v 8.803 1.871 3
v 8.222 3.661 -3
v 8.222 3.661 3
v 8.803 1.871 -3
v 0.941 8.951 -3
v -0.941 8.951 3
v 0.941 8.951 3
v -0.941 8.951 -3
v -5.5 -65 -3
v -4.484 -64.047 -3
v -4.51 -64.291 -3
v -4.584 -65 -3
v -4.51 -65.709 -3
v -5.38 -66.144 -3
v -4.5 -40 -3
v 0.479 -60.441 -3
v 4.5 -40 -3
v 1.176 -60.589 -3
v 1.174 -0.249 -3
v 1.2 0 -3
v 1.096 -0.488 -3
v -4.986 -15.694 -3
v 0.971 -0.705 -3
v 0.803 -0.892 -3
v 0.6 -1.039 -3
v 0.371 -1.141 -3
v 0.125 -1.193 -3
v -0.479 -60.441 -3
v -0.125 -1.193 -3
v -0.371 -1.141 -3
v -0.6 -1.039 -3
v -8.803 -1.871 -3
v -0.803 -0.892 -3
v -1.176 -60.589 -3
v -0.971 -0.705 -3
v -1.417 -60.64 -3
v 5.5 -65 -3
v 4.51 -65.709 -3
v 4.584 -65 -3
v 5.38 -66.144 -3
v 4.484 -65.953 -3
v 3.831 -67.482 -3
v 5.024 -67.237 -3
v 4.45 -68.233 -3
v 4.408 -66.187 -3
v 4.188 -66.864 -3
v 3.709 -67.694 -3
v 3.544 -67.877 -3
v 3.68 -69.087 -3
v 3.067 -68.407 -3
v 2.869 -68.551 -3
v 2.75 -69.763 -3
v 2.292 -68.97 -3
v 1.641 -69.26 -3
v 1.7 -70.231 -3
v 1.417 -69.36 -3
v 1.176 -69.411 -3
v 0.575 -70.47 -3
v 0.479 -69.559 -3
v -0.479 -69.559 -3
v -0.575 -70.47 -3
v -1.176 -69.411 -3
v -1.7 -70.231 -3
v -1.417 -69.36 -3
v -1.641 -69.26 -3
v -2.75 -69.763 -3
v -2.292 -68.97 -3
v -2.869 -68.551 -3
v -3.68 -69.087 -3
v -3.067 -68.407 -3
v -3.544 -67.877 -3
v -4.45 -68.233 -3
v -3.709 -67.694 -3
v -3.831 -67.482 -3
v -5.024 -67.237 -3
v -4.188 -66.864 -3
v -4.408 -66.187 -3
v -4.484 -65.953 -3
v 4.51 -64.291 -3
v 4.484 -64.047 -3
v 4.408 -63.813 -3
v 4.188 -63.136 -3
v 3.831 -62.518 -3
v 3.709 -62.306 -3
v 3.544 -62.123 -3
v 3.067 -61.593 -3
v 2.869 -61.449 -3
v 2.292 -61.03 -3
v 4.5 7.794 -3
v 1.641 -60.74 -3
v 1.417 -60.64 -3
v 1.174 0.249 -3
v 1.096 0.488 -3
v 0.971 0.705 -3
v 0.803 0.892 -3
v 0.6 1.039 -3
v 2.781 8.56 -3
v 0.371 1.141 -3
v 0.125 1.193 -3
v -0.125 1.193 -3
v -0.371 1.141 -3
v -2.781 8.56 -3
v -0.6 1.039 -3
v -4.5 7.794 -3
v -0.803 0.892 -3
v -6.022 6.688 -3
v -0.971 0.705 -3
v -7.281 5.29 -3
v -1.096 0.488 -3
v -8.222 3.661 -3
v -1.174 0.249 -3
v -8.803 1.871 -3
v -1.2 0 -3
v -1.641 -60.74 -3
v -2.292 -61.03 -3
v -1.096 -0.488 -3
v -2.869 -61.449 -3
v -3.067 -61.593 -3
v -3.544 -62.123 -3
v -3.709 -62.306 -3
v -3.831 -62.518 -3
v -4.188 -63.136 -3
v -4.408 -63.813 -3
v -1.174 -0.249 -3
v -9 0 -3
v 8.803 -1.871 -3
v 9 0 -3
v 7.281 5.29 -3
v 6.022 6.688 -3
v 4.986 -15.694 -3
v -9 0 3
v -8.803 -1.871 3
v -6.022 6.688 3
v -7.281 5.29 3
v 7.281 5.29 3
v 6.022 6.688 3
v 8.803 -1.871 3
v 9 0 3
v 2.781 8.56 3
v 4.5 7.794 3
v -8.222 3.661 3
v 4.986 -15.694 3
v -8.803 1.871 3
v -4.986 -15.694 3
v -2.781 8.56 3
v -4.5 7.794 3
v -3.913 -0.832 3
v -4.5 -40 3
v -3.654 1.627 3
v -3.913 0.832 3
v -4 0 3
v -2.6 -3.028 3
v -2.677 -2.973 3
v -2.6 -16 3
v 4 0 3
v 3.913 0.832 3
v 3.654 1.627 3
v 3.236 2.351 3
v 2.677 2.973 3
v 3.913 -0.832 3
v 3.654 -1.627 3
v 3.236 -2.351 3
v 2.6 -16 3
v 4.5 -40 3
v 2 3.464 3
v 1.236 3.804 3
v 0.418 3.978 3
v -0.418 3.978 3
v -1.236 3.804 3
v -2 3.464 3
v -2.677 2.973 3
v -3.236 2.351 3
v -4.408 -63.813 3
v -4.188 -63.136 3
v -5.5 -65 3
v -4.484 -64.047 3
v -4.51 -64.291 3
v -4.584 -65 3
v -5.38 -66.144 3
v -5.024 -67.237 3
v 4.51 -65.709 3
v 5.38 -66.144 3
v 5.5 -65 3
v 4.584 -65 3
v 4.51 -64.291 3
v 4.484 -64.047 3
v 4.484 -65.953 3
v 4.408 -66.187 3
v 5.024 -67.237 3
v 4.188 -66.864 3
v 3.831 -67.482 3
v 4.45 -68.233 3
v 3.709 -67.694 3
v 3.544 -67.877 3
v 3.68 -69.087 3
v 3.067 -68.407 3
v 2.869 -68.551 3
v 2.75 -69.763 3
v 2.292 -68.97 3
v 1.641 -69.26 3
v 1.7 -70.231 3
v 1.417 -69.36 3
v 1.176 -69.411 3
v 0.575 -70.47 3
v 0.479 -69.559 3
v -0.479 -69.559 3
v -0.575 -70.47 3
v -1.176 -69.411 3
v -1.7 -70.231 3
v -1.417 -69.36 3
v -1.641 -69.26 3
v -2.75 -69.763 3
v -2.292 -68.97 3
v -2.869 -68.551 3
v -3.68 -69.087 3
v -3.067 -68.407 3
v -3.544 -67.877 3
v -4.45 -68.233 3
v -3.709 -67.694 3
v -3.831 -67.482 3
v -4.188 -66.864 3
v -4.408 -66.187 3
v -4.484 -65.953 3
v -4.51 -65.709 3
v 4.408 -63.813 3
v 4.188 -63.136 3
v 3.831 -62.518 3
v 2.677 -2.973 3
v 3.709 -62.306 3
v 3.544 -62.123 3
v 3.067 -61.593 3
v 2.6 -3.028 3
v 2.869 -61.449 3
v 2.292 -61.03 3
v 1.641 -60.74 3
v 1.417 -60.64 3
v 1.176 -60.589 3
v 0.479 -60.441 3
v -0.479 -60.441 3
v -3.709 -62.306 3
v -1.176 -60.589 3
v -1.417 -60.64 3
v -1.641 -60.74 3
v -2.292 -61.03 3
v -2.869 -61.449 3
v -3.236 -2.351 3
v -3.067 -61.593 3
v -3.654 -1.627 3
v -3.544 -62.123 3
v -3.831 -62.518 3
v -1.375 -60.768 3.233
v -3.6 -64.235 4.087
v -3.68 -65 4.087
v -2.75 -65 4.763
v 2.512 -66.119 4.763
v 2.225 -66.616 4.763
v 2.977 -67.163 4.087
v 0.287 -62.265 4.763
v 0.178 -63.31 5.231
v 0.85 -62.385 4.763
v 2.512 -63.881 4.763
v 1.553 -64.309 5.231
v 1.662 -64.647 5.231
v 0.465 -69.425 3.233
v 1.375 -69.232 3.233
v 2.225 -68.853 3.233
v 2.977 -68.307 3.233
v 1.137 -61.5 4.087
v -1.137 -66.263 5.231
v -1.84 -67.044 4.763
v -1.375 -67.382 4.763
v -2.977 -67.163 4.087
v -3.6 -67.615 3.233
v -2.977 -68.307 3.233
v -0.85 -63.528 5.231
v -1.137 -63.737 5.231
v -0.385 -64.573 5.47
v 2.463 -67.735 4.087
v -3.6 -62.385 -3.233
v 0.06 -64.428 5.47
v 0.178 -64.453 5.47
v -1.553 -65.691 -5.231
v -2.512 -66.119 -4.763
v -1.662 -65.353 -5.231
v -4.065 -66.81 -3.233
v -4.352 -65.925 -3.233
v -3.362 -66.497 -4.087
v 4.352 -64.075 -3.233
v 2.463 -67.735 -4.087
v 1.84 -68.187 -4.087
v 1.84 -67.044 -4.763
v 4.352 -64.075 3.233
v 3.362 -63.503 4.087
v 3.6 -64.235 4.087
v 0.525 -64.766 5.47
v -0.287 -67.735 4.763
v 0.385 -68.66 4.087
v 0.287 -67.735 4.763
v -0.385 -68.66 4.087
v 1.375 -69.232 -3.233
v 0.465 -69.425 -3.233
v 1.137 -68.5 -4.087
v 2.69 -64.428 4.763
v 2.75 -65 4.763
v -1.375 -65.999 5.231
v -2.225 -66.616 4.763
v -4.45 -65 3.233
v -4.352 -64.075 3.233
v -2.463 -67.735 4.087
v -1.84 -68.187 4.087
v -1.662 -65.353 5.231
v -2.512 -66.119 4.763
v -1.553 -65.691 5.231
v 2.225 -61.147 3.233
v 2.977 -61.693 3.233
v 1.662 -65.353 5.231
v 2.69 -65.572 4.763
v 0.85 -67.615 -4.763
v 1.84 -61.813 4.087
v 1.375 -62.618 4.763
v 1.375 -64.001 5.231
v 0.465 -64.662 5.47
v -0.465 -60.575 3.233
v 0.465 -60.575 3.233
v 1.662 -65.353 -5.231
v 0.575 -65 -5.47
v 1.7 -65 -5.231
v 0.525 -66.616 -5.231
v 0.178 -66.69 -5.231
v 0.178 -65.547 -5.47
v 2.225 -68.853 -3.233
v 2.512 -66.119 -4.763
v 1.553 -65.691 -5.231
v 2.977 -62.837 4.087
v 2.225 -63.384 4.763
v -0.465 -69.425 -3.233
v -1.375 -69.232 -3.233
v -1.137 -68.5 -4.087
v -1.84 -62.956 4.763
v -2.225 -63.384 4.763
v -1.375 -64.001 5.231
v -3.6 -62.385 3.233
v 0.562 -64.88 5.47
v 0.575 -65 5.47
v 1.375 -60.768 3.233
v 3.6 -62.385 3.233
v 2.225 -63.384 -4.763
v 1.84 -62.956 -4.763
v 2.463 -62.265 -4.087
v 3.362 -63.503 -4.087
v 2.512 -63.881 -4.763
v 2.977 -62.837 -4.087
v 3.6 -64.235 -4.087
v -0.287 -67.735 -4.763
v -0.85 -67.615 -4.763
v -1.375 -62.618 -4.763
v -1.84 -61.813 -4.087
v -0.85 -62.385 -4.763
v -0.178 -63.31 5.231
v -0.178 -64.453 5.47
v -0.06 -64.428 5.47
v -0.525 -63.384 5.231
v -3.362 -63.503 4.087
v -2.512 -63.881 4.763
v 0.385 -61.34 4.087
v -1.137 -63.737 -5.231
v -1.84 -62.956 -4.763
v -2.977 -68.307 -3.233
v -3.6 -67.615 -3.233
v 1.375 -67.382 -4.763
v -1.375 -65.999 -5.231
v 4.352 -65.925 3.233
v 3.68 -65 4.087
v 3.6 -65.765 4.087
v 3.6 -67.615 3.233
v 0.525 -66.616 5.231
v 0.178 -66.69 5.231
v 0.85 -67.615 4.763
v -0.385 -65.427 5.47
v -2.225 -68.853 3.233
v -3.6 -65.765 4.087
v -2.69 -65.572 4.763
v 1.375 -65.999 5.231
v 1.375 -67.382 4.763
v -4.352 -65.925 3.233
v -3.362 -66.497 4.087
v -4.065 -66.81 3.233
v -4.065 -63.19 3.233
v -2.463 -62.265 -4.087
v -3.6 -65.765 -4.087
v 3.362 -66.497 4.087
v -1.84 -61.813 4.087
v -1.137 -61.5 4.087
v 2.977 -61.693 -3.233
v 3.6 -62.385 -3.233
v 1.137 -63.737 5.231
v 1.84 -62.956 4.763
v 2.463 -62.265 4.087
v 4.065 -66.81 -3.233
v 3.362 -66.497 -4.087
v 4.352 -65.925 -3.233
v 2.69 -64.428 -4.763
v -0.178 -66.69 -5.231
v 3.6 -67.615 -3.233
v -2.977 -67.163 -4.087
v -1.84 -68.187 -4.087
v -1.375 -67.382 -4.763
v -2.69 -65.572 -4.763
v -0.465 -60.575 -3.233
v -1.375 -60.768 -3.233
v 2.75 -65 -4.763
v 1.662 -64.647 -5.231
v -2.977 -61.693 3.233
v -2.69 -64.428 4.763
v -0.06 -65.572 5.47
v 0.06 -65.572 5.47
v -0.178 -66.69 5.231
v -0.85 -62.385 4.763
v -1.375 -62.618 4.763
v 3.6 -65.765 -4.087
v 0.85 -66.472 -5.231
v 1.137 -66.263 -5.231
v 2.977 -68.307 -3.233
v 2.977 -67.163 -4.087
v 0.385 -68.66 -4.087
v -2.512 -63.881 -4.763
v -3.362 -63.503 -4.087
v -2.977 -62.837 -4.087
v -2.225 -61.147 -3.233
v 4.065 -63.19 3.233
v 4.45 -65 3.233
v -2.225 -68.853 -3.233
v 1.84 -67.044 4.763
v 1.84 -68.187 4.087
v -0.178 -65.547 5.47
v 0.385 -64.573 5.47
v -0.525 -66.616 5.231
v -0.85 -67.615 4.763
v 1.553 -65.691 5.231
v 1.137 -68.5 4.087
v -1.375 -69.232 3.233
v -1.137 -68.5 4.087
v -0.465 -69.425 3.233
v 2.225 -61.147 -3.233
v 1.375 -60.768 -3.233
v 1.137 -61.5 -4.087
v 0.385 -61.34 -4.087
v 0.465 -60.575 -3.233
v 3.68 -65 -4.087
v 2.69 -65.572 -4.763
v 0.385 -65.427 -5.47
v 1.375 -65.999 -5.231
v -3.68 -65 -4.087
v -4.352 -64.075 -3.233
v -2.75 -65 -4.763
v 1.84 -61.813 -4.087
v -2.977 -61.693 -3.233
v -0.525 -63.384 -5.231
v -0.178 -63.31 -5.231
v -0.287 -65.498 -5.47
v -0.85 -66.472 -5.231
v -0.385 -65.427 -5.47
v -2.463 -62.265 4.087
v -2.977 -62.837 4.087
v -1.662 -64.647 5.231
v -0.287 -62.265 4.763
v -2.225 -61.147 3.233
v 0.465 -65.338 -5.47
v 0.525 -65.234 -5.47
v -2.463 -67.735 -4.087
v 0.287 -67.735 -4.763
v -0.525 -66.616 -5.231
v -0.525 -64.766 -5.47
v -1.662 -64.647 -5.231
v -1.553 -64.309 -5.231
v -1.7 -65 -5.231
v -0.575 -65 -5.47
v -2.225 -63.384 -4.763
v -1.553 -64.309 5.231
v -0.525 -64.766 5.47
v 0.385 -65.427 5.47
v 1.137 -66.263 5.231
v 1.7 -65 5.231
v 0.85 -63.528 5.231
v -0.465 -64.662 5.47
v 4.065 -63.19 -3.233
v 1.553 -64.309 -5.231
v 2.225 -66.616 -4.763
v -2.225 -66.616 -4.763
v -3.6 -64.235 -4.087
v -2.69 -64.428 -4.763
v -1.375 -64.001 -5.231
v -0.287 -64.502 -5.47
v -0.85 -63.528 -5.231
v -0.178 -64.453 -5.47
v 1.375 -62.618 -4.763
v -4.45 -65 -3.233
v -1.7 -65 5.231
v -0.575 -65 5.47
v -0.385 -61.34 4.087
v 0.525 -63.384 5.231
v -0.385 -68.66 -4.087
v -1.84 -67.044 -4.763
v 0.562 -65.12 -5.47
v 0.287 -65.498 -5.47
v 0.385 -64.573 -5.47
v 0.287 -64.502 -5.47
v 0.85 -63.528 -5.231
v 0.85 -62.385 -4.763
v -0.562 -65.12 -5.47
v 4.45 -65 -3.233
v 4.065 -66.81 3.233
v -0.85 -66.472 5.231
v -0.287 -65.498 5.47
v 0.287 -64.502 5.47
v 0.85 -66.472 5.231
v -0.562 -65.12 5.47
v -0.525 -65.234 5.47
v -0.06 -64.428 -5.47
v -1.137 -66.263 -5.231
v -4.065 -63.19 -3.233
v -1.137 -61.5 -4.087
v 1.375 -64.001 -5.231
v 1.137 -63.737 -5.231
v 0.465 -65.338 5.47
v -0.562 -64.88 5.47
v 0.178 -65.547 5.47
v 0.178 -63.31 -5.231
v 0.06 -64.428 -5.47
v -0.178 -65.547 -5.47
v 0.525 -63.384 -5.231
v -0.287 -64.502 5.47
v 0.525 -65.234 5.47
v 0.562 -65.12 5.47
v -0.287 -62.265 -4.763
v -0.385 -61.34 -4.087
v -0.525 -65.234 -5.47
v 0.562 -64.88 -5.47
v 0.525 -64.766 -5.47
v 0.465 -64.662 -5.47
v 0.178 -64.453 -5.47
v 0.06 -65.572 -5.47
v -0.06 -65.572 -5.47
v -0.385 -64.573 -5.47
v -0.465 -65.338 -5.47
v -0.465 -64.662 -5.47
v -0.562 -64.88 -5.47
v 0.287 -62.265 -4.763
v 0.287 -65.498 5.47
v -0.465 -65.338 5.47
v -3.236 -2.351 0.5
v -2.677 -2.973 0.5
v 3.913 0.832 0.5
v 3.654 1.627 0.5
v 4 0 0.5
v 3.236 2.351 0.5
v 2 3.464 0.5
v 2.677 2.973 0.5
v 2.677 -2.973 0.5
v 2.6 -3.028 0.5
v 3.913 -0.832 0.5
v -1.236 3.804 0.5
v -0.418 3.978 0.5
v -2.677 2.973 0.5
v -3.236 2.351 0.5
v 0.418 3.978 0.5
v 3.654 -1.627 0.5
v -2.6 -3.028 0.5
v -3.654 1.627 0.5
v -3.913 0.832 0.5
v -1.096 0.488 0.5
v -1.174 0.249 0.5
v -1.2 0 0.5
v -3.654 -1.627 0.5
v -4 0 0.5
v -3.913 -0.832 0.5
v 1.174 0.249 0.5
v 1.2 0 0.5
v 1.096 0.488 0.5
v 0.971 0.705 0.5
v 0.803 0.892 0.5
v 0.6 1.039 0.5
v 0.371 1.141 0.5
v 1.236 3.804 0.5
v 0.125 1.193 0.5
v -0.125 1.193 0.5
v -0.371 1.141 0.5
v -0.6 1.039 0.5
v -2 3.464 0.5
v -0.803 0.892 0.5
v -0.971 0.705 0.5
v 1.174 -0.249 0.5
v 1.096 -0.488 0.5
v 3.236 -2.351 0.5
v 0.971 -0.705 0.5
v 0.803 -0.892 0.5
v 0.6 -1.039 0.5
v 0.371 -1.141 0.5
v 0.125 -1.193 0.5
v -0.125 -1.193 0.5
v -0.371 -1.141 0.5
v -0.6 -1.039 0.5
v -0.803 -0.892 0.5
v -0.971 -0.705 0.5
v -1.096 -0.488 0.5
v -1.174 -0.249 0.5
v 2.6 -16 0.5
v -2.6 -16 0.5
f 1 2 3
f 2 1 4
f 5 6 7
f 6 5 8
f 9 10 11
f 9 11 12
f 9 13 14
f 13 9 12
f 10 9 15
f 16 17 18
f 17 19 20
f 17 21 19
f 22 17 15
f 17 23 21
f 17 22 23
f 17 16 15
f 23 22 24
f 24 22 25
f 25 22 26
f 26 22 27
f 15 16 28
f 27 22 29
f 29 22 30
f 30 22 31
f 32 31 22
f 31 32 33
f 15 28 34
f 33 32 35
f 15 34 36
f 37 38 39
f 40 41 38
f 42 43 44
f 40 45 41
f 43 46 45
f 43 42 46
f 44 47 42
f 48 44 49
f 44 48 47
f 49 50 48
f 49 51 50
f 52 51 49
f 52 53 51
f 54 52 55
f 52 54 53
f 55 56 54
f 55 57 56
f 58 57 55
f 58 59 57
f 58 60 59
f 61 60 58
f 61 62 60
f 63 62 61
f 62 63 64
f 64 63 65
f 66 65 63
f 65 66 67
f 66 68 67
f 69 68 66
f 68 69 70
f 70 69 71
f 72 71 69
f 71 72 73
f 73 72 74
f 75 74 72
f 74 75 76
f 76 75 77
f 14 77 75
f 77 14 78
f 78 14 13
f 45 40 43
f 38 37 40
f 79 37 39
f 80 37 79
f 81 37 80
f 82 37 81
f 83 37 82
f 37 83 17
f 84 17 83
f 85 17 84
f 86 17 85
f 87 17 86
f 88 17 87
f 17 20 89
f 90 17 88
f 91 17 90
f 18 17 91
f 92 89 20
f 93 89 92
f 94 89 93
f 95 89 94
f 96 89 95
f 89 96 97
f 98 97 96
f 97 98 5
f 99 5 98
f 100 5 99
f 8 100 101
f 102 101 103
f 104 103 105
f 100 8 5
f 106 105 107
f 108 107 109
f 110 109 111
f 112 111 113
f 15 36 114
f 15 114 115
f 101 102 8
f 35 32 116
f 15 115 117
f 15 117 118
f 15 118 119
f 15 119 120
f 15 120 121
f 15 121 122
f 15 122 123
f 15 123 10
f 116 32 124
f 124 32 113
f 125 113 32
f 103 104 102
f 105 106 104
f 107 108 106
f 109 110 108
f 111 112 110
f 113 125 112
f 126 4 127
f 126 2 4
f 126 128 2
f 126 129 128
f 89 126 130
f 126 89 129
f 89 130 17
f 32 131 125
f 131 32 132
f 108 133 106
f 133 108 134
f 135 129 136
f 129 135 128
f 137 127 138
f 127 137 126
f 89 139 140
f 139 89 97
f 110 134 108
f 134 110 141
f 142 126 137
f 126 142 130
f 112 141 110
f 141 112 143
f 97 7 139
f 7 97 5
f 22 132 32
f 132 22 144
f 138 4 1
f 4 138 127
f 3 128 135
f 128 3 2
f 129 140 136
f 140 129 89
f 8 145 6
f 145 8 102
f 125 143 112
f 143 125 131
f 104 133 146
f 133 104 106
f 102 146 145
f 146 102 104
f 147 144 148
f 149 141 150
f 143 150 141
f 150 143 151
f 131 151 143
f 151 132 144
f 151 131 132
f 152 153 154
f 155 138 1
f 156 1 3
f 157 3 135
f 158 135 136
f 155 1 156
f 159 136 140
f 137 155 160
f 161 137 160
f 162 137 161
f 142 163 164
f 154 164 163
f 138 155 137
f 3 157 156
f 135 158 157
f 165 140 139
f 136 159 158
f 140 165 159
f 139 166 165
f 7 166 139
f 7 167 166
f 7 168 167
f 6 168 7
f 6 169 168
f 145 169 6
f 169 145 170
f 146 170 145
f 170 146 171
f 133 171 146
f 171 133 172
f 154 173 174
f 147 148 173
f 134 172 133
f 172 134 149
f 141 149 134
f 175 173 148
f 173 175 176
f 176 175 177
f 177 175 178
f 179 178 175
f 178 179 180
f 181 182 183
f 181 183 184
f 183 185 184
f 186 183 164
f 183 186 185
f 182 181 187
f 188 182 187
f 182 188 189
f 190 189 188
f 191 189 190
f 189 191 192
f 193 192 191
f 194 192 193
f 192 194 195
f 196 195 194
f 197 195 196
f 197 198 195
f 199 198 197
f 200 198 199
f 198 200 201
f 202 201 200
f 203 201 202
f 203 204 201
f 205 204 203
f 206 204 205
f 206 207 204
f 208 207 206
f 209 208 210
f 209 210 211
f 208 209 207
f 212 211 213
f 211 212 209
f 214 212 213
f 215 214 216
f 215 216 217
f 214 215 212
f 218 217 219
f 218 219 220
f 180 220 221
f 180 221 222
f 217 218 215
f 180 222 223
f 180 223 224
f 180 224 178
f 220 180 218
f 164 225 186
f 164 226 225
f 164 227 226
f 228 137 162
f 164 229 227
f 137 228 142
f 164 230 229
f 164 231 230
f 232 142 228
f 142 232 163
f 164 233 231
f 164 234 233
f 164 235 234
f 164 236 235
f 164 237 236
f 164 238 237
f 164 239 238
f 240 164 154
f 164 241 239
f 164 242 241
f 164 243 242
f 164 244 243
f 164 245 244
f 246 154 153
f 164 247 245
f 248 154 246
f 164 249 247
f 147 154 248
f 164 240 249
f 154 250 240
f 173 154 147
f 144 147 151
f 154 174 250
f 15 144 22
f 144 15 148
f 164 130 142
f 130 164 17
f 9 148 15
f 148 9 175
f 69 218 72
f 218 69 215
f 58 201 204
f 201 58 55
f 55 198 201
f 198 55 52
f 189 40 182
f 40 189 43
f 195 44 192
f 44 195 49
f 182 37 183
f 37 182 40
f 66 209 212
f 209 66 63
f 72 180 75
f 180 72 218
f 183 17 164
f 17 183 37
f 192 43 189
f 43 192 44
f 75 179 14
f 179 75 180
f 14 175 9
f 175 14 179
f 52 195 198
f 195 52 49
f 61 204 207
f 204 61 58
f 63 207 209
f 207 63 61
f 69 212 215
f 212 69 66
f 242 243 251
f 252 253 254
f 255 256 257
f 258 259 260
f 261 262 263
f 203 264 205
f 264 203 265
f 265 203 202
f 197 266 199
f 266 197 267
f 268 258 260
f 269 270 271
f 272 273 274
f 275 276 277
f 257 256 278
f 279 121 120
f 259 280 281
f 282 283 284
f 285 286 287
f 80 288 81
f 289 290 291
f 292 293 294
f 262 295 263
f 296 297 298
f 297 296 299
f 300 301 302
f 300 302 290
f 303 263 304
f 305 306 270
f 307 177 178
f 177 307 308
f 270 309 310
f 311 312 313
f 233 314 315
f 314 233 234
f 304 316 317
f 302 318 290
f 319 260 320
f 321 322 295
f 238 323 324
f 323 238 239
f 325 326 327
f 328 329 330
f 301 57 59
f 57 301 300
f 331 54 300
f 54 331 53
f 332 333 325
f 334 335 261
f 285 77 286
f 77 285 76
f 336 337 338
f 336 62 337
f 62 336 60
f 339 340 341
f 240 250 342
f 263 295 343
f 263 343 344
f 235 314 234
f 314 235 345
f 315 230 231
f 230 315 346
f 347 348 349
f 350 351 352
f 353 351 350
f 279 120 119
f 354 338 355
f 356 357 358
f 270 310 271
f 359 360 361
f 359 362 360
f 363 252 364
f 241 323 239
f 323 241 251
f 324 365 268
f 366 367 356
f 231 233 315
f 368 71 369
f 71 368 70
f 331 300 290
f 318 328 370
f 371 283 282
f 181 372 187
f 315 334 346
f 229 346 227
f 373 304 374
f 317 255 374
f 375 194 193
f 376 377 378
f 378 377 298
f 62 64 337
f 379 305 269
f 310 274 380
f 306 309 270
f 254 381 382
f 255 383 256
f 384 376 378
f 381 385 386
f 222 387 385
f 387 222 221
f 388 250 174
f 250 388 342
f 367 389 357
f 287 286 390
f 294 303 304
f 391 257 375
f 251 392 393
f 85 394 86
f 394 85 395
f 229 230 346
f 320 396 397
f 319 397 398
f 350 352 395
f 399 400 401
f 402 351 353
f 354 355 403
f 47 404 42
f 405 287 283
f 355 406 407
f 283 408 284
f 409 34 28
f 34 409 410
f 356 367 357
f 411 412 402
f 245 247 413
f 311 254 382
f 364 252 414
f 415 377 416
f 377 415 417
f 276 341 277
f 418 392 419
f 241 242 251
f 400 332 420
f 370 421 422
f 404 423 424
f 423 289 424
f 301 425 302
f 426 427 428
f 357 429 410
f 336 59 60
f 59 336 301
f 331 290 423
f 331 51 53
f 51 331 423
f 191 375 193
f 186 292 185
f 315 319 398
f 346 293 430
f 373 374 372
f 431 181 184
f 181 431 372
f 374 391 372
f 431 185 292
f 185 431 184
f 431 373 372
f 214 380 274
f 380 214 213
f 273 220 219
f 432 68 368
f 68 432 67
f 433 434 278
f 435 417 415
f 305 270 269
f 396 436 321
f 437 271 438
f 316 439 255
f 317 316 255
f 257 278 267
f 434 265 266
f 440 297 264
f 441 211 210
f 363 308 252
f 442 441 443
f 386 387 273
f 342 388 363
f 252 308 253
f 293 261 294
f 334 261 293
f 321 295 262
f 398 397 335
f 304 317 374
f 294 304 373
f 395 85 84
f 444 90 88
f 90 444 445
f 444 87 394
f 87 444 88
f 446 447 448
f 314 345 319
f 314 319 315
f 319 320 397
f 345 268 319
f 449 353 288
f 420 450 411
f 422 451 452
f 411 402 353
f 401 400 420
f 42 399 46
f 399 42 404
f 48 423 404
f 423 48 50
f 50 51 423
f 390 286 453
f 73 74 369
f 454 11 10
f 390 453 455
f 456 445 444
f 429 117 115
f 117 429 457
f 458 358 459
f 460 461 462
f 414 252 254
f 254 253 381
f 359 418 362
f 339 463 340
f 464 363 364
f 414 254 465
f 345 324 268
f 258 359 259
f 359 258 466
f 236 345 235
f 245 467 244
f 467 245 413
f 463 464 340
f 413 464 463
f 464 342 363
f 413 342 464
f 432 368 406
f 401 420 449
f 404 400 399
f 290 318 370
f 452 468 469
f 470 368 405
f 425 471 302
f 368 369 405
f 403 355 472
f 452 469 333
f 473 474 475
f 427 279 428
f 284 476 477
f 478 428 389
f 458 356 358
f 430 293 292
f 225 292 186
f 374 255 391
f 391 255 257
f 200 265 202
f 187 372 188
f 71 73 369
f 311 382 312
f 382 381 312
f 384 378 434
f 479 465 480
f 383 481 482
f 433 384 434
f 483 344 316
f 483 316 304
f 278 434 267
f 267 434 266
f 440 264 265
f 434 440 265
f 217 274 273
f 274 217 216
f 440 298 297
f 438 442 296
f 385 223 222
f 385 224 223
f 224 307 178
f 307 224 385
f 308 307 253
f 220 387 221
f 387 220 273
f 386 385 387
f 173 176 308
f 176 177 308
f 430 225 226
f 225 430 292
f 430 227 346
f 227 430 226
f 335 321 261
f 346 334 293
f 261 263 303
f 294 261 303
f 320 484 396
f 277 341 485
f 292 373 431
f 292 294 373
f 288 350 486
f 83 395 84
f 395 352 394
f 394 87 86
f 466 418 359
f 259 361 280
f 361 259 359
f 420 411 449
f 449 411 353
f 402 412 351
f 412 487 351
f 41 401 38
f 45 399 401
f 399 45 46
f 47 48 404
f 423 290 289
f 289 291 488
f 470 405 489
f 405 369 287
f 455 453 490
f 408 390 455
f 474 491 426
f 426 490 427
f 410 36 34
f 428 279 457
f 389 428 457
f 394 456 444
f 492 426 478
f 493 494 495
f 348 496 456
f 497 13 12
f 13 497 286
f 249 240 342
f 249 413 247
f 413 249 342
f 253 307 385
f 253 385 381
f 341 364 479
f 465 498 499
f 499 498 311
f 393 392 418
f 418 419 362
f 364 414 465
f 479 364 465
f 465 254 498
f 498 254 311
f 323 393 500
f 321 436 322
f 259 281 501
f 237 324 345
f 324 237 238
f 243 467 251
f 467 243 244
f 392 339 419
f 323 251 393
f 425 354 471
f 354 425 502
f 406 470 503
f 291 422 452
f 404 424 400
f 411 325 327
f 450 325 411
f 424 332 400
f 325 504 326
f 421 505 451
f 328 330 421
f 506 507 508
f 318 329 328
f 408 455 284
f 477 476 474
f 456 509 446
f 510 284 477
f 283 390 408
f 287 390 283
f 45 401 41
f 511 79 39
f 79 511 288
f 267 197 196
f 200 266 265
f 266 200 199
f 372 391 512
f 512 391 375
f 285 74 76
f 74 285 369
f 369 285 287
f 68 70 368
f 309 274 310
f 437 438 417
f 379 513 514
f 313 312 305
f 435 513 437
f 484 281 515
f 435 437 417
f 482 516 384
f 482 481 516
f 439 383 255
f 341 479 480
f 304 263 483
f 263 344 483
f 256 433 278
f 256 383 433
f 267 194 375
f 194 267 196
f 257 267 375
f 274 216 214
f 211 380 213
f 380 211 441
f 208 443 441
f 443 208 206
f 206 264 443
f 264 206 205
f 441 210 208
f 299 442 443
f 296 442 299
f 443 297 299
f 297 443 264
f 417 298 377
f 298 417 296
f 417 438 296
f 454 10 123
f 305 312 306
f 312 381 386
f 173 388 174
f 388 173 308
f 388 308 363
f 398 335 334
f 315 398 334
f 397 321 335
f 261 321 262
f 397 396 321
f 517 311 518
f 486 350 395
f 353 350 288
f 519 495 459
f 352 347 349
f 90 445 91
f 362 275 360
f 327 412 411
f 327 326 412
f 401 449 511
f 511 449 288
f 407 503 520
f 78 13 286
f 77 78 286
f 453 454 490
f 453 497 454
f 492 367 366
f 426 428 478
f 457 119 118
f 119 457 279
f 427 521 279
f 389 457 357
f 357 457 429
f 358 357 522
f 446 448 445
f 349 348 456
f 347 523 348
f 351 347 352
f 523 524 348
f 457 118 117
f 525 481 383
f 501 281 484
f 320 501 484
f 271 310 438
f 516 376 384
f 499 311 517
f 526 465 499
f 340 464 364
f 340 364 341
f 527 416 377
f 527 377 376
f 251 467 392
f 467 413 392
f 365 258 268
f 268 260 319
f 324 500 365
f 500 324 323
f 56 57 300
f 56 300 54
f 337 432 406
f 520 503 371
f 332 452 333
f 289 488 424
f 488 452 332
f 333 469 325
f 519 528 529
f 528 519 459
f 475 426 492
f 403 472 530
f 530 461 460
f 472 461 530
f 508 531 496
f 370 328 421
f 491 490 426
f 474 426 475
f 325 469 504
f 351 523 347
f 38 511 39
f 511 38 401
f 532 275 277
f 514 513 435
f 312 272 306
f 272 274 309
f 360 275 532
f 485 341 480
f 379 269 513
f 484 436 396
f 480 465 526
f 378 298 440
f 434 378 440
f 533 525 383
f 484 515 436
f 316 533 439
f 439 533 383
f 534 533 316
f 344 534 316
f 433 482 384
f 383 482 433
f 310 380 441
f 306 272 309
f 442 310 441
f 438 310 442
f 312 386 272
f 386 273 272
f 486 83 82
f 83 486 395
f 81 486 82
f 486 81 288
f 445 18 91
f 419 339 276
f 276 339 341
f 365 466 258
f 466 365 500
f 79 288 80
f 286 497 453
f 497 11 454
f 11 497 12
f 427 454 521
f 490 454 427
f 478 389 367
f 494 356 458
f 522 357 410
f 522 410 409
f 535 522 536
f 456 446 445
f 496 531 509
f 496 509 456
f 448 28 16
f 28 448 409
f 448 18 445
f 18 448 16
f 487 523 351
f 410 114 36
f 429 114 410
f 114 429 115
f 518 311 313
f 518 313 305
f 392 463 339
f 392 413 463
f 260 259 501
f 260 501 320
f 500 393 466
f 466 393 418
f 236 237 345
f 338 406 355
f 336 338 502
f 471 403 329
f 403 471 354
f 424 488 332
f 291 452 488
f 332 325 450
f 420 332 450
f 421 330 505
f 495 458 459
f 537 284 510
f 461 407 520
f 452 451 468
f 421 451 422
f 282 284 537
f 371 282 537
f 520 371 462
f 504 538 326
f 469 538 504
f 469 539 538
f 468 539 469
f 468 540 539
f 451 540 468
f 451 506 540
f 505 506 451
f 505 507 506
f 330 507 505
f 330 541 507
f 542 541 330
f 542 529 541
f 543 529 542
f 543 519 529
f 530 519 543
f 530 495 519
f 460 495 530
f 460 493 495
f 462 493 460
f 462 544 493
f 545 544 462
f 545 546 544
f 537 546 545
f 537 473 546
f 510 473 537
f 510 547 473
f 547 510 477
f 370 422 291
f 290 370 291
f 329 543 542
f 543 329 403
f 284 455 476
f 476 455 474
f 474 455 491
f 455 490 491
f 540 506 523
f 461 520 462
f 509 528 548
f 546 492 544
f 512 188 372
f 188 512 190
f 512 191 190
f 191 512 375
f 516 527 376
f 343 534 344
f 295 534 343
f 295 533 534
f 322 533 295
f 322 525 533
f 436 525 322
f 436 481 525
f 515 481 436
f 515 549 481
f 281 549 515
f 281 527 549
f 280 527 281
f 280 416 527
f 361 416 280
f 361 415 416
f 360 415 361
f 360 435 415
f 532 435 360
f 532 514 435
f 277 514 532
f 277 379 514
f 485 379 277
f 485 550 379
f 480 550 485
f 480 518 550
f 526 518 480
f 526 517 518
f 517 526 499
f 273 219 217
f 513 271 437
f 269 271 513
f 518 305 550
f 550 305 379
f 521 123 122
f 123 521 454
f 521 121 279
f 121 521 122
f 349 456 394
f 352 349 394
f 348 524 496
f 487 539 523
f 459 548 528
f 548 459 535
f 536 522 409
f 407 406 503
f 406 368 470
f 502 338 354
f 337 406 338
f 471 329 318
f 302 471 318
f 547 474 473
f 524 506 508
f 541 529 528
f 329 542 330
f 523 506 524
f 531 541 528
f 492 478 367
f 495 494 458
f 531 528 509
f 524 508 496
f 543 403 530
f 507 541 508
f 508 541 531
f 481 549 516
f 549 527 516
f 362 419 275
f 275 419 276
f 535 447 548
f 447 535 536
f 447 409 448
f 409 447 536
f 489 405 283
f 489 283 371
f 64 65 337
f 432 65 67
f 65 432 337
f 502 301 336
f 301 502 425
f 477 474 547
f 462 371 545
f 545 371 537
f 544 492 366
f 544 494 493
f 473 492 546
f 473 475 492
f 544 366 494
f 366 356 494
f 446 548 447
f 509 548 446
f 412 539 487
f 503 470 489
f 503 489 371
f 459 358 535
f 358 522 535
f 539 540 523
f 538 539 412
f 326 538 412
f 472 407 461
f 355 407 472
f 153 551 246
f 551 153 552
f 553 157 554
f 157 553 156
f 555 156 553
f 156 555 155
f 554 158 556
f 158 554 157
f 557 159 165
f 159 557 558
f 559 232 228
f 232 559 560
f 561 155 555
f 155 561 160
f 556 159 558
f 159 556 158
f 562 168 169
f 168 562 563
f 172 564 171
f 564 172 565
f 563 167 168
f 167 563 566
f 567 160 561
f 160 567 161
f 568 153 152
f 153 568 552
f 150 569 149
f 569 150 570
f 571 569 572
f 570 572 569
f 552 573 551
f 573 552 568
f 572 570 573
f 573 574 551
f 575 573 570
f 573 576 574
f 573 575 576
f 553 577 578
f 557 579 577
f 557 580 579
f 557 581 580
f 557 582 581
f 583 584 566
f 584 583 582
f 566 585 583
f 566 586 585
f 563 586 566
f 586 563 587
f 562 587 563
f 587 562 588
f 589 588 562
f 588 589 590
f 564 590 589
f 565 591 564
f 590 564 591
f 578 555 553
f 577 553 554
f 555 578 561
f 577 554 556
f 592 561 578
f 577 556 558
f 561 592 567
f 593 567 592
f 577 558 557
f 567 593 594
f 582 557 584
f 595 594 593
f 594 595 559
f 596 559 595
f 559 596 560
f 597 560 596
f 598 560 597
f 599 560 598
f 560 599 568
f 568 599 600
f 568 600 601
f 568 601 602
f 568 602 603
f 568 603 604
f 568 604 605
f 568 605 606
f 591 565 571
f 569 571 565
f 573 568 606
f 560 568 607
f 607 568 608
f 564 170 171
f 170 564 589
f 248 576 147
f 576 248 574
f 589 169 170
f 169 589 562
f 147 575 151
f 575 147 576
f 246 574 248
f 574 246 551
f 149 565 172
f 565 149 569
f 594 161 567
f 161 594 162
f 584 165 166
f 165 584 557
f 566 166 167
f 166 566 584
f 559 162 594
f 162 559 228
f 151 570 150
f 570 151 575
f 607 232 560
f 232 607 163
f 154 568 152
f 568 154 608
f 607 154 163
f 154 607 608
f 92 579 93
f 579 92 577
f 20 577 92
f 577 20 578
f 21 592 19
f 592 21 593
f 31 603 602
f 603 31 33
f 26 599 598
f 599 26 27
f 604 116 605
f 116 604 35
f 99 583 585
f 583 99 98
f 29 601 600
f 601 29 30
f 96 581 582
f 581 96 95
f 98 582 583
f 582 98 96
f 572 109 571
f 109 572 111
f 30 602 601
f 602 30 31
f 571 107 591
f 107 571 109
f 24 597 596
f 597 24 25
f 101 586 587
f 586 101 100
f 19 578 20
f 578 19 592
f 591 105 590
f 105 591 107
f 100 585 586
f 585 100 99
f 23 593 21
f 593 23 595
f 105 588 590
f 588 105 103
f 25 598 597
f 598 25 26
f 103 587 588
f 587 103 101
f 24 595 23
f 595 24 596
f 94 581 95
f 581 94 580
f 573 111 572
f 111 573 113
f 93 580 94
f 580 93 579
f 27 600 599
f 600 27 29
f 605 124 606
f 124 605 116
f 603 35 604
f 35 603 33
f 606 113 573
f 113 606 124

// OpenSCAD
// Tibia Híbrida (Pie recto simplificado estilo SP-8)
// Adaptada para acoplarse al horn del servo de rodilla (Knee Pitch).
// Cuerpo recto que desciende verticalmente y termina en punta esférica antideslizante.

$fn = 30;

tibia_h = 65.0;
tibia_t = 6.0;

module tibia_hibrida() {
    difference() {
        union() {
            hull() {
                cylinder(r = 9, h = tibia_t, center=true);
                translate([0, -15, 0])
                    cylinder(r = 5, h = tibia_t, center=true);
            }
            hull() {
                translate([0, -15, 0])
                    cylinder(r = 5, h = tibia_t, center=true);
                translate([0, -40, 0])
                    cylinder(r = 4.5, h = tibia_t, center=true);
            }
            hull() {
                translate([0, -40, 0])
                    cylinder(r = 4.5, h = tibia_t, center=true);
                translate([0, -tibia_h, 0])
                    cylinder(r = 5.5, h = tibia_t, center=true);
            }
            translate([0, -tibia_h, 0])
                sphere(r = 5.5);
        }

        // 1. Acople para el horn del servo de Rodilla en (0,0) a Z=1.8
        translate([0, 0, 1.8]) {
            cylinder(r = 4.0, h = 2.6, center=true);
            translate([0, -8.0, 0])
                cube([5.2, 16.0, 2.6], center=true);
            cylinder(r = 1.2, h = 10, center=true);
        }
    }
}

tibia_hibrida();
